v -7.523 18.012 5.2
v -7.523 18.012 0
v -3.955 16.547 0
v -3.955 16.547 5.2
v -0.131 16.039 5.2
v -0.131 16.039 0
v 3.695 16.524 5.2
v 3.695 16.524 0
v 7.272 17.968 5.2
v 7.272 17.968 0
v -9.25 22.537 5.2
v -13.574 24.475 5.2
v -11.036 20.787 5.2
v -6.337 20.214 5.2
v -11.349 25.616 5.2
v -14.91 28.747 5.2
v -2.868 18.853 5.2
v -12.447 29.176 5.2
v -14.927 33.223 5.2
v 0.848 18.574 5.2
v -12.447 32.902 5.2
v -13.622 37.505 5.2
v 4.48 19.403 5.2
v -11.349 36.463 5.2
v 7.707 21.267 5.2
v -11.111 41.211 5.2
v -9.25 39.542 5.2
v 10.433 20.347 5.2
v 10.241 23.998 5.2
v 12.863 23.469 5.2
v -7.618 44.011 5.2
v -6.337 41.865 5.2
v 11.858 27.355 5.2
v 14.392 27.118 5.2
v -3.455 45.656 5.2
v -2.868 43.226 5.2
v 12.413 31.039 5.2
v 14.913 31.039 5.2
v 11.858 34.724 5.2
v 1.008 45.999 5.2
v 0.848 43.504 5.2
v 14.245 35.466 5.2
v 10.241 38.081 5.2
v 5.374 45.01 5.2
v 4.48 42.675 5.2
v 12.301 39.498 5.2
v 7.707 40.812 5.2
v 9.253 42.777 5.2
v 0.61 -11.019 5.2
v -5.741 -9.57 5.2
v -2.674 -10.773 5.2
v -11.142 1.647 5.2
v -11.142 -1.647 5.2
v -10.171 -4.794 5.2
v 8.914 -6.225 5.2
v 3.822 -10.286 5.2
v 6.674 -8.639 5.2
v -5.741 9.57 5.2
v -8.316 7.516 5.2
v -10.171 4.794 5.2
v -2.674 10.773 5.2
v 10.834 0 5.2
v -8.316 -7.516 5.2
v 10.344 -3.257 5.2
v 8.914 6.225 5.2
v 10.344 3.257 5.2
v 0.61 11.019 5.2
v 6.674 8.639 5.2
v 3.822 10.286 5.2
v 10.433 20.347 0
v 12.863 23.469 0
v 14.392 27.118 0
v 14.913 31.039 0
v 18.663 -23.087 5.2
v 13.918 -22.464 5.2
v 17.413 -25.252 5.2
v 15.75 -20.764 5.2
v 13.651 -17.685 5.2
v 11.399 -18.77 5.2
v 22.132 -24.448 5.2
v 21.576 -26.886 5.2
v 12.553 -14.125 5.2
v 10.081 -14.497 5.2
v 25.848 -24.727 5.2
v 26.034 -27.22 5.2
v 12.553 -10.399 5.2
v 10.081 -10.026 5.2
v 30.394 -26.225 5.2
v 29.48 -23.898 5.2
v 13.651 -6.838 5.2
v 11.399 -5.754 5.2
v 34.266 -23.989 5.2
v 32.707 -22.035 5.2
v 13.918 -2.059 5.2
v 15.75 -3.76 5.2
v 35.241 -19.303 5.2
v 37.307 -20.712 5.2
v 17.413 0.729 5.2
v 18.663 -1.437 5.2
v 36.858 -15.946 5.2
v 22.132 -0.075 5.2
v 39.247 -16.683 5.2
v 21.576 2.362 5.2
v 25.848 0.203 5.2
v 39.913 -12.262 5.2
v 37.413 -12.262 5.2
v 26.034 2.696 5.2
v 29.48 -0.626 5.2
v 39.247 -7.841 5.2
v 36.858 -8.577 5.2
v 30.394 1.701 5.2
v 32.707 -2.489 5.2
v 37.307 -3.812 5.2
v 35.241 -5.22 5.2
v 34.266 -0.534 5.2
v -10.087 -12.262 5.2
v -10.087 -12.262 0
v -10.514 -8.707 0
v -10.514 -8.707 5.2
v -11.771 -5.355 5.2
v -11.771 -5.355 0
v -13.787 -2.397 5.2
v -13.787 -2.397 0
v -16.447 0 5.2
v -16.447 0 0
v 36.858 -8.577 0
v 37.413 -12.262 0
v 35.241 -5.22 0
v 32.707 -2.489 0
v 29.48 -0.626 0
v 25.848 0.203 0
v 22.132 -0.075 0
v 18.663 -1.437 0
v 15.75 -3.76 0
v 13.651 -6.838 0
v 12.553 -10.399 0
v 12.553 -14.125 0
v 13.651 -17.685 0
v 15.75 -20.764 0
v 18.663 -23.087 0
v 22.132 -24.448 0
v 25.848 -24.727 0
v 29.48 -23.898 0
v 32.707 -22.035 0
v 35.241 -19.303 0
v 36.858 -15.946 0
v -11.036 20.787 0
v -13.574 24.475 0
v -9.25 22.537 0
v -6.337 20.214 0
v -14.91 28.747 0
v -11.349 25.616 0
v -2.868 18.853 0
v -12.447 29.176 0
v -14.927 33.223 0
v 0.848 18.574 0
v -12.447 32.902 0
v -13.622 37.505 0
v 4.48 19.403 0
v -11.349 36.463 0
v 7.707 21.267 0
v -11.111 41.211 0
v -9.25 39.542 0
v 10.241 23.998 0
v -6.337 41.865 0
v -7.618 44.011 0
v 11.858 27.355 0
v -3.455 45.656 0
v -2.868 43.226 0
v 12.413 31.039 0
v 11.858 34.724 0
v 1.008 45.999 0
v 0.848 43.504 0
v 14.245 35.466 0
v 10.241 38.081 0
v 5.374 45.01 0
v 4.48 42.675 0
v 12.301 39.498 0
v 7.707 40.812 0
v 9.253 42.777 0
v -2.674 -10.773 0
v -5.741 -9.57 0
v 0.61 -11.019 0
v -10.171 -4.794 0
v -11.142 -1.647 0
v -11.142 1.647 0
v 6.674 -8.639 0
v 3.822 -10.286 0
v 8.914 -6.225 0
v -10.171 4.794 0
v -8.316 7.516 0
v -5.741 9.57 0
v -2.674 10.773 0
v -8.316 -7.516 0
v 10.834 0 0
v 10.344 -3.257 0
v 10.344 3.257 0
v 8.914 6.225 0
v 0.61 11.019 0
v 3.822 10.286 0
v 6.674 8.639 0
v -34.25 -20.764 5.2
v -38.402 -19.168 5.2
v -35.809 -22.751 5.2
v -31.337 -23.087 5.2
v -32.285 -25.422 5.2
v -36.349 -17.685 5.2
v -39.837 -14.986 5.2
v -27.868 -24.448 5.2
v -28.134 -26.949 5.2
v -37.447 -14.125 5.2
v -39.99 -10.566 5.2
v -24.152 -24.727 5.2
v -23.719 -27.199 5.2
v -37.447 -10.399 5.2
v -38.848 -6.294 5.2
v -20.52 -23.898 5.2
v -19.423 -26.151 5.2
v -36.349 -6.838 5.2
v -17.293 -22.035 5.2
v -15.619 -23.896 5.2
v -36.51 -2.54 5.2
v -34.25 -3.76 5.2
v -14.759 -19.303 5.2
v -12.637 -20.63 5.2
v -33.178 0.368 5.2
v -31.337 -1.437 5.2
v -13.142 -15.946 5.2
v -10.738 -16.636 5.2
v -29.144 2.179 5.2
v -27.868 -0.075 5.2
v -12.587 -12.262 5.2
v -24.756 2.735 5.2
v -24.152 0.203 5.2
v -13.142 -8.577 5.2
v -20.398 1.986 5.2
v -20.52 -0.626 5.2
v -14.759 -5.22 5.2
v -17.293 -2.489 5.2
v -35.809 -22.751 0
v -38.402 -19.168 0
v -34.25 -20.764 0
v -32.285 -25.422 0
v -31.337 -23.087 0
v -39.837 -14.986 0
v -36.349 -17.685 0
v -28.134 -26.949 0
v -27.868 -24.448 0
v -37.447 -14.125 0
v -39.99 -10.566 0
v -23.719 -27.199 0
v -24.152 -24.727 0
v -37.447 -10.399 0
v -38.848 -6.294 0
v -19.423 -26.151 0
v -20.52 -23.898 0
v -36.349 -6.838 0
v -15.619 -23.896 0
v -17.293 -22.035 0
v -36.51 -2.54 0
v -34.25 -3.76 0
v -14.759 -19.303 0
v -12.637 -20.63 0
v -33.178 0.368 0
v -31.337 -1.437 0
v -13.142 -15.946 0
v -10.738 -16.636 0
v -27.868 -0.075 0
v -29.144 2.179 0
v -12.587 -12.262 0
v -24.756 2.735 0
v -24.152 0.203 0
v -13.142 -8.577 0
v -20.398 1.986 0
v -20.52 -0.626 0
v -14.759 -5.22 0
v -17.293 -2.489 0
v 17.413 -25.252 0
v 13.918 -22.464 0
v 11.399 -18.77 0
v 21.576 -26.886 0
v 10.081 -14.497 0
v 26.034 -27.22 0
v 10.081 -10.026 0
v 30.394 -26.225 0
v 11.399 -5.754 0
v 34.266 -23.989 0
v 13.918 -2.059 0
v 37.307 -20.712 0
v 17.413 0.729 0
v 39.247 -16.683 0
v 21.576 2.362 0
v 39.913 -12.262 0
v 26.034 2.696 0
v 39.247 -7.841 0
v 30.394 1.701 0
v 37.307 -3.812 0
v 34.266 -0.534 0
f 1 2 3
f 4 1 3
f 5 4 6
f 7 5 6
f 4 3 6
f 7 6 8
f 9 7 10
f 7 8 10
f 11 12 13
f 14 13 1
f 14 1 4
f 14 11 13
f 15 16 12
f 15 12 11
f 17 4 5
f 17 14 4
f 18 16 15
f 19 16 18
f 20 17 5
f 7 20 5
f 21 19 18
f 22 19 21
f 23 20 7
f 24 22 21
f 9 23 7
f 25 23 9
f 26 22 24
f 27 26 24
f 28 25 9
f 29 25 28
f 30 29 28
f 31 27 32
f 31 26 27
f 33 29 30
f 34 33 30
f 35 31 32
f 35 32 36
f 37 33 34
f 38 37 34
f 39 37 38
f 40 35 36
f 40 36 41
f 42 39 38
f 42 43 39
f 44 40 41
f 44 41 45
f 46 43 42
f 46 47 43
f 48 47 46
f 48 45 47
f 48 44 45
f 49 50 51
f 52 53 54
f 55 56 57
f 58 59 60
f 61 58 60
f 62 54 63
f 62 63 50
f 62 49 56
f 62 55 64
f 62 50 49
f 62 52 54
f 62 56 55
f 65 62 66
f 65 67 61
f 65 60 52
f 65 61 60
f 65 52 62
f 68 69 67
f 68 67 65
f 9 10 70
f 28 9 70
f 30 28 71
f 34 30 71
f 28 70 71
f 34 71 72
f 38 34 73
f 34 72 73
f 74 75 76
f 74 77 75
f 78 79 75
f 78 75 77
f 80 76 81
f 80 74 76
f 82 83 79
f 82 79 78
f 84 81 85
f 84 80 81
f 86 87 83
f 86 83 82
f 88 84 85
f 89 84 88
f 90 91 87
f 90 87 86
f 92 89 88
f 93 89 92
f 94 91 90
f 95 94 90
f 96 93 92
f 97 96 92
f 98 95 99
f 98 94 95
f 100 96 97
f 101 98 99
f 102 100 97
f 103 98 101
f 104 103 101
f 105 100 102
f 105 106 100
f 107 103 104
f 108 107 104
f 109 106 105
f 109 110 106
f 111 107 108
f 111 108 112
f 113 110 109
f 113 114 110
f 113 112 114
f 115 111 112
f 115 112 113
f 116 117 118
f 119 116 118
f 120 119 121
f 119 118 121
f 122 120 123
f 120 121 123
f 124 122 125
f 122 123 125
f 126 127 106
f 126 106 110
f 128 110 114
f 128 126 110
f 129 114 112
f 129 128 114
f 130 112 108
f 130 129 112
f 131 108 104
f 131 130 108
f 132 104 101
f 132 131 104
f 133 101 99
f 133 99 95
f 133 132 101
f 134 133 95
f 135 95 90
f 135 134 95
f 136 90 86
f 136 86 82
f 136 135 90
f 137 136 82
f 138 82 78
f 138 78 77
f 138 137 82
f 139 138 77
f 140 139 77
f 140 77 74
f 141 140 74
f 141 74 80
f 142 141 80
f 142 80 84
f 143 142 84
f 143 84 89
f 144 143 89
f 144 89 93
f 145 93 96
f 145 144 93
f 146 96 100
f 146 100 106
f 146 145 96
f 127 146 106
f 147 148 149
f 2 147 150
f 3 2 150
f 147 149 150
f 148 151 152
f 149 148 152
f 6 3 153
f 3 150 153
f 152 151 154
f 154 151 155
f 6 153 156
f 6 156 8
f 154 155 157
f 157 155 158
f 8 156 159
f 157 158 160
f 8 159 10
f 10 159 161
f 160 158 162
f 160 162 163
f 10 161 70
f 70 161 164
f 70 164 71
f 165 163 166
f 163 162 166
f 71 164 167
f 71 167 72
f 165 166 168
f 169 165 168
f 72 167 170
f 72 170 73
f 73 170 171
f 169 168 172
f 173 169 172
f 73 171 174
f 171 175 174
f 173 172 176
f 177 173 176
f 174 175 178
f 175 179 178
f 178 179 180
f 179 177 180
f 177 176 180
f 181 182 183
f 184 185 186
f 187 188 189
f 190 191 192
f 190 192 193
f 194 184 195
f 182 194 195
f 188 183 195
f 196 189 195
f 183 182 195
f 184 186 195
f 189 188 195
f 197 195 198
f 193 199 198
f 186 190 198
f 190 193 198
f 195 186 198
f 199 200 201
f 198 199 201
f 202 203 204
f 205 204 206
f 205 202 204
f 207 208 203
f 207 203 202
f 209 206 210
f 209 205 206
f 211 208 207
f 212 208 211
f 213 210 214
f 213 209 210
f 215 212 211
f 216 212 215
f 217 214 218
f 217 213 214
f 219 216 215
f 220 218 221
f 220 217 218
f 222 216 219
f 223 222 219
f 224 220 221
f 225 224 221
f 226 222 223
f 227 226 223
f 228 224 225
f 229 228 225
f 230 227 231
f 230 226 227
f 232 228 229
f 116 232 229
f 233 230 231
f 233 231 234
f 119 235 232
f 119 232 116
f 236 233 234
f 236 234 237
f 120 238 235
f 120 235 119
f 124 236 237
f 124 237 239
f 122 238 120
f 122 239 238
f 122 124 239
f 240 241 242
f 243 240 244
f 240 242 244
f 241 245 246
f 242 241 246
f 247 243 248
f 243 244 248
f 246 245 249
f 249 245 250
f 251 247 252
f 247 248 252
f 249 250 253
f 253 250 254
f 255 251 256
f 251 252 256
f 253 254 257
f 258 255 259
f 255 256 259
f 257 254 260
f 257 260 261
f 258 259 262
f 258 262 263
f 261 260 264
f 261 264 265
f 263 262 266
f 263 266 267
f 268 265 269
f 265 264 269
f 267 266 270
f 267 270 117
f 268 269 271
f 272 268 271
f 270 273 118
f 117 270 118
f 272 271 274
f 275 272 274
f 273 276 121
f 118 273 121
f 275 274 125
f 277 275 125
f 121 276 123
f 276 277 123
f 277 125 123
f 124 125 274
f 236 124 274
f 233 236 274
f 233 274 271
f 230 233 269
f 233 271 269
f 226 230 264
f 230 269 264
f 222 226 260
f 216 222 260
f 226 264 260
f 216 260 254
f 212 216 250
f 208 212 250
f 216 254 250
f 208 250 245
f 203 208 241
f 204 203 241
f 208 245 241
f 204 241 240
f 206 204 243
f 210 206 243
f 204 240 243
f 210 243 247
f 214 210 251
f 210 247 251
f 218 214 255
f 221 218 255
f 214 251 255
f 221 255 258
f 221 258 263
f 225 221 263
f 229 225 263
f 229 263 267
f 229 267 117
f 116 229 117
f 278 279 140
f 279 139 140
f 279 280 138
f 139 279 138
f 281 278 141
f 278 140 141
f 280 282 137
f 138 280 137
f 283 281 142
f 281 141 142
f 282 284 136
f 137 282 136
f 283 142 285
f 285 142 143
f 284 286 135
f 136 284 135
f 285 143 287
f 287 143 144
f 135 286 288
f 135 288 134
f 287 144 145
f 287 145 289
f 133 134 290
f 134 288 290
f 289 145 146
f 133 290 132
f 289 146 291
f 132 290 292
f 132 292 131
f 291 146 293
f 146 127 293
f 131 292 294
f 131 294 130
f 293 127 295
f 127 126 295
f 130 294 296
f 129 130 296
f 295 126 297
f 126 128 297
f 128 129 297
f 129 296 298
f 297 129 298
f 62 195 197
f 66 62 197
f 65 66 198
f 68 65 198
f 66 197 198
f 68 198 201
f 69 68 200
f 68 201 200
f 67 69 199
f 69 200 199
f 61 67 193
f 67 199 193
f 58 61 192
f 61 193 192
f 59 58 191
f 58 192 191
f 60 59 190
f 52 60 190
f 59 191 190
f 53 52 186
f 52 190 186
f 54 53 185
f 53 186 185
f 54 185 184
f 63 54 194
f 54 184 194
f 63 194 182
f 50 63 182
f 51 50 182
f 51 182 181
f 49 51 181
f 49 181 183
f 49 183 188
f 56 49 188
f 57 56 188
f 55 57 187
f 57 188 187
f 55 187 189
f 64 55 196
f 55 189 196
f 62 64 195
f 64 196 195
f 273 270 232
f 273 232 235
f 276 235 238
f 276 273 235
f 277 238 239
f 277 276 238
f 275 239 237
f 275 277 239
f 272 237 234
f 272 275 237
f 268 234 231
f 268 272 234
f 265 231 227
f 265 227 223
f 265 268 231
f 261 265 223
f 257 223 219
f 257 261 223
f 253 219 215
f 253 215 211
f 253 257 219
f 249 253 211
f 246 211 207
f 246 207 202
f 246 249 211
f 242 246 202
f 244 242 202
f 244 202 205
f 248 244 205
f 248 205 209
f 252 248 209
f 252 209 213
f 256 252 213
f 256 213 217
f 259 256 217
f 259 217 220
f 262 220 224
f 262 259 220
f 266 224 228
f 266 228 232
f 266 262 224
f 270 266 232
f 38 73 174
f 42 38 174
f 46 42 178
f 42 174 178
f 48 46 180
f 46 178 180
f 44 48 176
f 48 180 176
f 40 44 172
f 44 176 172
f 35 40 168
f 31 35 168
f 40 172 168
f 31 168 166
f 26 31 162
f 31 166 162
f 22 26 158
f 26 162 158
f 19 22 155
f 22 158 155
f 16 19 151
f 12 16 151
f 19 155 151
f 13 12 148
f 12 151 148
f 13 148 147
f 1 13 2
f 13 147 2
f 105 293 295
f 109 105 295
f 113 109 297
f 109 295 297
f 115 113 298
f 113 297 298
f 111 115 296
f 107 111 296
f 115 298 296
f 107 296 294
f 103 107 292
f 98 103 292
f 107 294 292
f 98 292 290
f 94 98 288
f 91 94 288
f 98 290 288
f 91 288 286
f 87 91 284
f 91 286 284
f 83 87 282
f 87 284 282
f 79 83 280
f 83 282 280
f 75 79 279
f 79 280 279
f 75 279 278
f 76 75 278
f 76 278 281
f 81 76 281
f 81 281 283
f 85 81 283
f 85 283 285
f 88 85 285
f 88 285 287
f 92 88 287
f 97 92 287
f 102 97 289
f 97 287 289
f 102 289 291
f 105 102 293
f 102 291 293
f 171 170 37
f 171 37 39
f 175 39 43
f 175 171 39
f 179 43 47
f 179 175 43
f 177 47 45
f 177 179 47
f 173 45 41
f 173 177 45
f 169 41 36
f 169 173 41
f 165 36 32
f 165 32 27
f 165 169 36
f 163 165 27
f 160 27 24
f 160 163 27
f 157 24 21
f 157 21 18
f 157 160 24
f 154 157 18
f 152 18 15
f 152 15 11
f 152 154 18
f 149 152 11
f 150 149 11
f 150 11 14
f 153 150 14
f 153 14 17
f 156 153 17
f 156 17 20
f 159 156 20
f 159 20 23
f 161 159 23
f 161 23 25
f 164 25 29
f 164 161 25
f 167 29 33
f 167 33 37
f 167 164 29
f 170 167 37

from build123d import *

# Parameters (mm, degrees)
F0_R     = 12.5
F0_R_2   = 15
F0_R_3   = 11.05
F1_DEPTH = 5.2


with BuildPart() as f1:
    # F0 (on Top) → F1 (new body)
    with BuildSketch(Plane.XY):
        with BuildLine():
            ThreePointArc((7.272041, 17.968416), (12.862939, 23.469045), (14.913441, 31.039415))
            ThreePointArc((14.913441, 31.039415), (-7.61833, 44.011401), (-7.522882, 18.012478))
            ThreePointArc((-7.522882, 18.012478), (-0.131231, 16.039482), (7.272041, 17.968416))
        make_face()
        with Locations((-0.086559, 31.039415)):
            Circle(F0_R, mode=Mode.SUBTRACT)
        with BuildLine():
            ThreePointArc((-10.086559, -12.261855), (-11.771198, -5.355252), (-16.446714, 0))
            ThreePointArc((-16.446714, 0), (-38.40192, -19.168458), (-10.086559, -12.261855))
        make_face()
        with Locations((-25.086559, -12.261855)):
            Circle(F0_R, mode=Mode.SUBTRACT)
        with Locations((24.913441, -12.261855)):
            Circle(F0_R_2)
        with Locations((24.913441, -12.261855)):
            Circle(F0_R, mode=Mode.SUBTRACT)
        with Locations((-0.215517, 0)):
            Circle(F0_R_3)
    extrude(amount=F1_DEPTH)


solid = f1.part
